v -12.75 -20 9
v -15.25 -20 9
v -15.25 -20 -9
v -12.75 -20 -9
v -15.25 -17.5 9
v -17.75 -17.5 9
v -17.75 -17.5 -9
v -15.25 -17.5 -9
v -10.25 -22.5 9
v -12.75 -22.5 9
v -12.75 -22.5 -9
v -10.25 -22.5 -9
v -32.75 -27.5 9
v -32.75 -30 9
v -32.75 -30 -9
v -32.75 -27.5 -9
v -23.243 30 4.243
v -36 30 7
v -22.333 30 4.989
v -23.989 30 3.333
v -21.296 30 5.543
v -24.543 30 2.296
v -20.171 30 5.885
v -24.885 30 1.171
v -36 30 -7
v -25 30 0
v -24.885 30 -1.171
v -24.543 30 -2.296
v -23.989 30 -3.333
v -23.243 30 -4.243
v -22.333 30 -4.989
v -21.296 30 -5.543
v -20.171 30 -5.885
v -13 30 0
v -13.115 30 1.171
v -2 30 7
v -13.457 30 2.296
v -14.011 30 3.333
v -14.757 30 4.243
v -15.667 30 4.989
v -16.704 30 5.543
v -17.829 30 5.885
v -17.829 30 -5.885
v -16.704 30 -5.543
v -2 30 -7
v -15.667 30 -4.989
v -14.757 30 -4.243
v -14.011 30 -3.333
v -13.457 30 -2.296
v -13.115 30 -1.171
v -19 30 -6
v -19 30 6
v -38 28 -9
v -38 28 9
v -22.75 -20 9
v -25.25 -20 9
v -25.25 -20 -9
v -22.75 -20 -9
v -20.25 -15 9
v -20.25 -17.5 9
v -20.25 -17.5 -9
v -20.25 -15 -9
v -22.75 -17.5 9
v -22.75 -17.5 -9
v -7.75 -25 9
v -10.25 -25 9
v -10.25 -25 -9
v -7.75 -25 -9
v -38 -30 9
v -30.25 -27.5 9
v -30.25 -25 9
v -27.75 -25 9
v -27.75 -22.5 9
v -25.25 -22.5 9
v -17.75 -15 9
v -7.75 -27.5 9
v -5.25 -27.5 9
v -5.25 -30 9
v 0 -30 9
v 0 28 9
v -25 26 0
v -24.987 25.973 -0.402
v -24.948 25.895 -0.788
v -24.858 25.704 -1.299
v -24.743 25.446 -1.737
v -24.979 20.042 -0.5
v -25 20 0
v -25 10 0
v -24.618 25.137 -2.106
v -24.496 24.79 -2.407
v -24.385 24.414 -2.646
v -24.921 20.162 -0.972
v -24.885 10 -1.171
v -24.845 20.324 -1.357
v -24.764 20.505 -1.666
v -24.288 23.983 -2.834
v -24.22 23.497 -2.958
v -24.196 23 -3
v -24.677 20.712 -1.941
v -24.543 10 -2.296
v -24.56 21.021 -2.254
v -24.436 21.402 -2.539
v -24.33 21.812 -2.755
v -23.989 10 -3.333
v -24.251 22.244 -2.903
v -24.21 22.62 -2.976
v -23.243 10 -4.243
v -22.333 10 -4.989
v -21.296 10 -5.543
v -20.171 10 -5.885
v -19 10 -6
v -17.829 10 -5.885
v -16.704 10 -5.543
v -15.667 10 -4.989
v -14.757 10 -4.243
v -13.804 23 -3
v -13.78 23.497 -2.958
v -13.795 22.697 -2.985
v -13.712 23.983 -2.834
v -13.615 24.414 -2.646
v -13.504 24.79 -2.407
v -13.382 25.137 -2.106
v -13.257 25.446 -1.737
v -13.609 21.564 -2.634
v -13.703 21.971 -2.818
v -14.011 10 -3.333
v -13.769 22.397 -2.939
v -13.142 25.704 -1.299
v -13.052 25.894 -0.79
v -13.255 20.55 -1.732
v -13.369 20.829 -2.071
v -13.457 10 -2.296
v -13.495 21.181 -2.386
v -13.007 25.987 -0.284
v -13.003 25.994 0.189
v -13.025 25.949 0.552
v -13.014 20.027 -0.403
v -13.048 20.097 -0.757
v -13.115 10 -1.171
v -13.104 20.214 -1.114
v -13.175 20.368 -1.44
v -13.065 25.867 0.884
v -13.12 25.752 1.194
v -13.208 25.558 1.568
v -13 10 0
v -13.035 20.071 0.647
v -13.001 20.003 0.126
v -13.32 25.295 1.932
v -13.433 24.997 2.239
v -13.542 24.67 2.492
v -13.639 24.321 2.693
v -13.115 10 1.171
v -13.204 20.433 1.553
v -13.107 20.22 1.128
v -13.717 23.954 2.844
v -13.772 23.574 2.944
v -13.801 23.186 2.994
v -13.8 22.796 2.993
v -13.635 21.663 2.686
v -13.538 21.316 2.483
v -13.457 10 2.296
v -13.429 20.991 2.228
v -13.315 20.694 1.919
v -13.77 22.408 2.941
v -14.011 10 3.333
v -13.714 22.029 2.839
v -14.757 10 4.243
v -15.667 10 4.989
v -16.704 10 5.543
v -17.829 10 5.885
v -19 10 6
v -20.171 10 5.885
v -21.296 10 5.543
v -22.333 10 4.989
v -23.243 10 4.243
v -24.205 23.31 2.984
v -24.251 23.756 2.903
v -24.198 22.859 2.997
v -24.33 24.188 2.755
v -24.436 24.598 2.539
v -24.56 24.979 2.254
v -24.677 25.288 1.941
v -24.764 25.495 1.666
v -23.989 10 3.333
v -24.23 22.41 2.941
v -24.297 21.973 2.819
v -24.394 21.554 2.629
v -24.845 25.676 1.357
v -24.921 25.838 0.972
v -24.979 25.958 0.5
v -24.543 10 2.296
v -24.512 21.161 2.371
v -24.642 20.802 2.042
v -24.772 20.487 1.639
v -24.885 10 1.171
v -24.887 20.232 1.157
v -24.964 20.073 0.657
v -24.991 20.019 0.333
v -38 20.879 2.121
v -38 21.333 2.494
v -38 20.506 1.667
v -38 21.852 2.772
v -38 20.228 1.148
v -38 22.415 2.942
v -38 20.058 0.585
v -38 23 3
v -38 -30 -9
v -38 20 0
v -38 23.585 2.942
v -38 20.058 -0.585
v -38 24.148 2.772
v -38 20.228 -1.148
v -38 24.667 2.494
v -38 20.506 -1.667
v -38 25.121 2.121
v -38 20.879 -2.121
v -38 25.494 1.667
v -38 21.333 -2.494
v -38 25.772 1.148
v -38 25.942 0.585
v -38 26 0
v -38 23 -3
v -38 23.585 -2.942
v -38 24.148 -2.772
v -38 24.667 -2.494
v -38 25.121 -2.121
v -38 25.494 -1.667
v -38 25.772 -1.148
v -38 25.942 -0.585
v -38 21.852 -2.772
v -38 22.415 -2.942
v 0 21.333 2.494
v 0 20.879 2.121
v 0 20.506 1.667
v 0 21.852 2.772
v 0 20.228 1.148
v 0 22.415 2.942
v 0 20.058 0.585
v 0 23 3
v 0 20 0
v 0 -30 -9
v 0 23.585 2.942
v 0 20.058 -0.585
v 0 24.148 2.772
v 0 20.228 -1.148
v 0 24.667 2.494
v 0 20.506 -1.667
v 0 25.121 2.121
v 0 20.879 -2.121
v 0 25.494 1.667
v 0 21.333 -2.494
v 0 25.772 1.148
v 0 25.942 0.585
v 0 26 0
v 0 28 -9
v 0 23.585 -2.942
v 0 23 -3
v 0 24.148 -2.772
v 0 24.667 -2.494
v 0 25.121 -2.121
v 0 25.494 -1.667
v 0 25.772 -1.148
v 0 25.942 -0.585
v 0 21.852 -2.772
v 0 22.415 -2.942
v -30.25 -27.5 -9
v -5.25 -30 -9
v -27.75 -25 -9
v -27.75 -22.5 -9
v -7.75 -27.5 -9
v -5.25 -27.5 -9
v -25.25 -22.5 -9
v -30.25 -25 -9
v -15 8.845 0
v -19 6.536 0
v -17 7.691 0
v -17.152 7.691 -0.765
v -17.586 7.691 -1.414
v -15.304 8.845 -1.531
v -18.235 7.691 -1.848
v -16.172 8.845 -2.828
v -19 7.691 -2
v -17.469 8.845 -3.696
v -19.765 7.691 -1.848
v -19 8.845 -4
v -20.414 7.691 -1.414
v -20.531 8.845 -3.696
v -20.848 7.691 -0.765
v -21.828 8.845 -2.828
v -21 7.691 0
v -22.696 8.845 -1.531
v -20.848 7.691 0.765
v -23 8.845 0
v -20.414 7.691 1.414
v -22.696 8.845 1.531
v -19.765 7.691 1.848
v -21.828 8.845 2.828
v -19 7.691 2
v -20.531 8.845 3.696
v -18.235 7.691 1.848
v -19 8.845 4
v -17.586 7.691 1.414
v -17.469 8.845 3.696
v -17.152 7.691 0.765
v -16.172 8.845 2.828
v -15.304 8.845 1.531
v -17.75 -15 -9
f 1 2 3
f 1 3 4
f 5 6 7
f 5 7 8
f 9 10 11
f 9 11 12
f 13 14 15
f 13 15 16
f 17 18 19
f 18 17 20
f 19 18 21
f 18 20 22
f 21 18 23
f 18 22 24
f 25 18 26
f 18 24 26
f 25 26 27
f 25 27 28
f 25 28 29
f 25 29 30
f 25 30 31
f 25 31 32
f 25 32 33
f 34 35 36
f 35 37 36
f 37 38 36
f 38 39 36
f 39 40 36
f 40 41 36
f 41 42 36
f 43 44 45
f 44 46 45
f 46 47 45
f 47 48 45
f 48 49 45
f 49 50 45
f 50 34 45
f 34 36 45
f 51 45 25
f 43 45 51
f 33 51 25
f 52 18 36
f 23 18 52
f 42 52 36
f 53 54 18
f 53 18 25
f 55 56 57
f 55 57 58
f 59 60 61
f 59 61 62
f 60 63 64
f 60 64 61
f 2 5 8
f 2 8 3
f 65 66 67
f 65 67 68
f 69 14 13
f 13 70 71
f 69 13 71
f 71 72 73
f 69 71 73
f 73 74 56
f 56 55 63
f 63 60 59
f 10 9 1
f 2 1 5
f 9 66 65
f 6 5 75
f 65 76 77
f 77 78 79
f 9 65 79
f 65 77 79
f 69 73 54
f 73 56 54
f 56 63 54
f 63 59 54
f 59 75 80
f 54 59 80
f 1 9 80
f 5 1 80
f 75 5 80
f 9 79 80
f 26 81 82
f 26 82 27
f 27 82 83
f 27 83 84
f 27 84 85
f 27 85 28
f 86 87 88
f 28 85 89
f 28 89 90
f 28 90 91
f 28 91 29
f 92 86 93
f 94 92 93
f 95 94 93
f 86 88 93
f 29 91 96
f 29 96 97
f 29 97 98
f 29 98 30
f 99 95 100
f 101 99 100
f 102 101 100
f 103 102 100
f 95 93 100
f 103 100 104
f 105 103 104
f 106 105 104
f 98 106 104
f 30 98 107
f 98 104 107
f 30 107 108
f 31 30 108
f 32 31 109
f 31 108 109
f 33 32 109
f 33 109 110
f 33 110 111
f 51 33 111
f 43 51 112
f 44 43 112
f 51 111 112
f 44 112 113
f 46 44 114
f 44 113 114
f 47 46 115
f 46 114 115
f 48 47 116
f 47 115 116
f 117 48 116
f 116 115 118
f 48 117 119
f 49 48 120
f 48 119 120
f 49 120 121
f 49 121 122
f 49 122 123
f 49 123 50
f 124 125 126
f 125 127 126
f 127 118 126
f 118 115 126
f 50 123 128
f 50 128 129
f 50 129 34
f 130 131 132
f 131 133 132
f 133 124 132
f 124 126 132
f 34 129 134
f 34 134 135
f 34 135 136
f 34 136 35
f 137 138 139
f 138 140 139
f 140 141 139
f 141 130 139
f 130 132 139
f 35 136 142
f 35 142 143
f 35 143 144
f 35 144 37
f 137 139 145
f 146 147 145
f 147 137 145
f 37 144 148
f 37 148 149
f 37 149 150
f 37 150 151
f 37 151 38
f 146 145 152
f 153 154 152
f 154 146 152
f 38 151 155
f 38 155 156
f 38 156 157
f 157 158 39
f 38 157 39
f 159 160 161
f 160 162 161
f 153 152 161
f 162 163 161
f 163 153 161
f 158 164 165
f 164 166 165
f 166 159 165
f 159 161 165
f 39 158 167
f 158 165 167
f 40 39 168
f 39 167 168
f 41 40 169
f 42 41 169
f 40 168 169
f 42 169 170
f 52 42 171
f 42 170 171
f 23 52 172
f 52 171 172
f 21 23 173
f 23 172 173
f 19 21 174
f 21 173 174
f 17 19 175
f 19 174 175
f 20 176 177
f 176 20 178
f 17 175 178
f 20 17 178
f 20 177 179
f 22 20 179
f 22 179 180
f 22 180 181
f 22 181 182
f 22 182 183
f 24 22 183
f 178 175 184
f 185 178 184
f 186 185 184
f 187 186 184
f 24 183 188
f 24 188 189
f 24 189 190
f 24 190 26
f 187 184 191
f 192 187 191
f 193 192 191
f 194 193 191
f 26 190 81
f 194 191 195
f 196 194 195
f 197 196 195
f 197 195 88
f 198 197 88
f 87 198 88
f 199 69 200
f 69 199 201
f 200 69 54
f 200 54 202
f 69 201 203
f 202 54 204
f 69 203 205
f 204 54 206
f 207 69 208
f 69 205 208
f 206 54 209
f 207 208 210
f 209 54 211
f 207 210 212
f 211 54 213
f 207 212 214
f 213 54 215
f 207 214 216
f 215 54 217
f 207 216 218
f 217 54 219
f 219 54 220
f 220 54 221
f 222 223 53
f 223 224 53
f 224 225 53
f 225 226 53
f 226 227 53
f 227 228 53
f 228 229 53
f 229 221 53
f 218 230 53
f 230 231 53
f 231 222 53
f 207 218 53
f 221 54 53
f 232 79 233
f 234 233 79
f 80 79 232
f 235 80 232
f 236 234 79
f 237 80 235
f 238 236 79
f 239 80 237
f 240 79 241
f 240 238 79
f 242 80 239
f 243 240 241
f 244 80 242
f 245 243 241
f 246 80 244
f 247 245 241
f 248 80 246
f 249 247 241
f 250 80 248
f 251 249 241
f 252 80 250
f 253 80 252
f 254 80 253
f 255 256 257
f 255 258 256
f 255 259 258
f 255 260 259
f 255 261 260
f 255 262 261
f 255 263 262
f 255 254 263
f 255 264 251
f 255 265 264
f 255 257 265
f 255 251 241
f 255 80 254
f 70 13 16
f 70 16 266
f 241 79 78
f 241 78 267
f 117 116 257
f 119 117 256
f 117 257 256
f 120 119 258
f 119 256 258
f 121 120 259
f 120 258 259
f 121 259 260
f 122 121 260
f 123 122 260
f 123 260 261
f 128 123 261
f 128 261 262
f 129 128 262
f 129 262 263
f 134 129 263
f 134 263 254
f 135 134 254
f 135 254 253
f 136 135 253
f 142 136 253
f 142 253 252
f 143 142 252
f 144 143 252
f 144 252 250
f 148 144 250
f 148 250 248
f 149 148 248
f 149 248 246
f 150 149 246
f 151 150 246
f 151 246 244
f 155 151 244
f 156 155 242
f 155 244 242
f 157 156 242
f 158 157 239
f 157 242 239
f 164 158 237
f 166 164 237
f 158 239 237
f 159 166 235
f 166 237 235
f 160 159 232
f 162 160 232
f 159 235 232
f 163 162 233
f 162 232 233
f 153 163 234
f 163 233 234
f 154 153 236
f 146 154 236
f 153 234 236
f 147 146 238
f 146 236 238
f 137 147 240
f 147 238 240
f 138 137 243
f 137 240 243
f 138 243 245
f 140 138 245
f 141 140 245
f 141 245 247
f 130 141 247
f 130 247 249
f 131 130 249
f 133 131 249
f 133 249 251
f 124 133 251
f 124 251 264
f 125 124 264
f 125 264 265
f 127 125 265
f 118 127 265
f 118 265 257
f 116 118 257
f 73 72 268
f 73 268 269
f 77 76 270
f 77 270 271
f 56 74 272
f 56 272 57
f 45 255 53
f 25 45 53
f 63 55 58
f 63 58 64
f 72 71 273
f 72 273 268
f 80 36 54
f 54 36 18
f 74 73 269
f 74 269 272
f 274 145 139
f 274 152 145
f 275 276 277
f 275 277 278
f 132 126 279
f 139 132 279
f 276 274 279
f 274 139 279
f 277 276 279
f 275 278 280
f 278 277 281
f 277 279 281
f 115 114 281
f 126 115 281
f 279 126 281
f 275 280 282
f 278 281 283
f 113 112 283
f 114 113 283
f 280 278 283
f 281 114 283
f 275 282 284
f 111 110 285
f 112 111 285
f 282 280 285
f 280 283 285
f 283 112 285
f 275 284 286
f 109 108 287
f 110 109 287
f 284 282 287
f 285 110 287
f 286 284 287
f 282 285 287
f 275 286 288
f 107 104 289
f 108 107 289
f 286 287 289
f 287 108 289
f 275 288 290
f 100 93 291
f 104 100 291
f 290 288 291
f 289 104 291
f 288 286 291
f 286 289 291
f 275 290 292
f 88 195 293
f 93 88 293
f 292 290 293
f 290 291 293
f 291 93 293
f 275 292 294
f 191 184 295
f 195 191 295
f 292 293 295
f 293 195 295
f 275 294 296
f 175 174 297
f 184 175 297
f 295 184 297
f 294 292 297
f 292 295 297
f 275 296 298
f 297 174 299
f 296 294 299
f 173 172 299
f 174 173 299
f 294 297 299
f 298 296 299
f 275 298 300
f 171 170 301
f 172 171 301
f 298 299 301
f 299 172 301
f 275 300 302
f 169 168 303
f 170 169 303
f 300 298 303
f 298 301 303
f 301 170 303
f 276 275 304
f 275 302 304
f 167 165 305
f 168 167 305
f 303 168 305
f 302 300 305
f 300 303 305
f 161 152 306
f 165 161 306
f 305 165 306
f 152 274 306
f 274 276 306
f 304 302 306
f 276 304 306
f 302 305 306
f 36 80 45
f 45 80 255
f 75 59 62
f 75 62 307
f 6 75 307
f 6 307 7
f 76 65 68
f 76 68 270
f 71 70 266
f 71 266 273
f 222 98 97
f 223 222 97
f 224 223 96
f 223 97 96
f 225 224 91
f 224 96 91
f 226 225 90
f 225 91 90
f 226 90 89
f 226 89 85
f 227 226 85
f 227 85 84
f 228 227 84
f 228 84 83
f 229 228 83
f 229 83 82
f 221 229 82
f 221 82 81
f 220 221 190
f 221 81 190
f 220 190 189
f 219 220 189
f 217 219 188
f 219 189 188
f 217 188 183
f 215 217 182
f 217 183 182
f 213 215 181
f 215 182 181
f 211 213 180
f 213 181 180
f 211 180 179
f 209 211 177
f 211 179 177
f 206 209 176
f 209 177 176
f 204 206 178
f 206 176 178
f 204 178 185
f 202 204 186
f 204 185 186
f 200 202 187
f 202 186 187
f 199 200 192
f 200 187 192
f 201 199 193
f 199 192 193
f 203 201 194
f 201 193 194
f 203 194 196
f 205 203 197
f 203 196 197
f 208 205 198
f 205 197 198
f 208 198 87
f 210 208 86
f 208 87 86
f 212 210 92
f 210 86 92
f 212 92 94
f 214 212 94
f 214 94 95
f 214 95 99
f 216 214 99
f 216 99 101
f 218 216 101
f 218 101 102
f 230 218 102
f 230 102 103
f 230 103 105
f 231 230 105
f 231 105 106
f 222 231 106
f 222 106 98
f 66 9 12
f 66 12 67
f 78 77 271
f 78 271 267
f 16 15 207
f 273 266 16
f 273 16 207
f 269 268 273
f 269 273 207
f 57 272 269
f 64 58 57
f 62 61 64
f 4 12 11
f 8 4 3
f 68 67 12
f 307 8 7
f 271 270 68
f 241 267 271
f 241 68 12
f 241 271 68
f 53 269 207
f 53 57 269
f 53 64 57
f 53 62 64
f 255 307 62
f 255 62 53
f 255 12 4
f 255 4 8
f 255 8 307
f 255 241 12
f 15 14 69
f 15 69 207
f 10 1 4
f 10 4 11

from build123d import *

# Parameters (mm, degrees)
SKETCH1_W                   = 18
SKETCH1_H                   = 60
SKETCH1_R                   = 3
BOSS_EXTRUDE1_DEPTH         = 38
CHAMFER1_SIZE               = 2
CUT_EXTRUDE1_DEPTH          = 38
M12X1_25_TAPPED_HOLE1_D     = 12
M12X1_25_TAPPED_HOLE1_DEPTH = 20
M12X1_25_TAPPED_HOLE1_TIP   = 3.464101615


with BuildPart() as part:
    # Sketch1 → Boss-Extrude1 (new body)
    with BuildSketch(Plane(origin=(0, 0, 0), x_dir=(0, 0, -1), z_dir=(1, 0, 0))):
        Rectangle(SKETCH1_W, SKETCH1_H)
        with Locations((0, 23)):
            Circle(SKETCH1_R, mode=Mode.SUBTRACT)
    extrude(amount=-BOSS_EXTRUDE1_DEPTH)

    # Chamfer1
    chamfer1_edges = [part.edges().sort_by_distance(p)[0] for p in [
        (-38, 30, 0),
        (0, 30, 0),
        (-19, 30, 9),
        (-19, 30, -9),
    ]]
    chamfer(chamfer1_edges, length=CHAMFER1_SIZE)

    # Sketch2 → Cut-Extrude1 (cut)
    with BuildSketch(Plane.XY.offset(9)):
        Polygon((-32.75, -30), (-32.75, -27.5), (-30.25, -27.5), (-30.25, -25), (-27.75, -25), (-27.75, -22.5), (-25.25, -22.5), (-25.25, -20), (-22.75, -20), (-22.75, -17.5), (-20.25, -17.5), (-20.25, -15), (-17.75, -15), (-17.75, -17.5), (-15.25, -17.5), (-15.25, -20), (-12.75, -20), (-12.75, -22.5), (-10.25, -22.5), (-10.25, -25), (-7.75, -25), (-7.75, -27.5), (-5.25, -27.5), (-5.25, -30), align=None)
    extrude(amount=-CUT_EXTRUDE1_DEPTH, mode=Mode.SUBTRACT)

    # M12x1.25 Tapped Hole1
    with Locations(Plane(origin=(0, 30, 0), x_dir=(1, 0, 0), z_dir=(0, 1, 0))):
        with Locations((-19, 0)):
            Hole(M12X1_25_TAPPED_HOLE1_D / 2, depth=M12X1_25_TAPPED_HOLE1_DEPTH)
            with Locations((0, 0, -(M12X1_25_TAPPED_HOLE1_DEPTH + M12X1_25_TAPPED_HOLE1_TIP / 2))):  # 120° drill point
                Cone(0, M12X1_25_TAPPED_HOLE1_D / 2, M12X1_25_TAPPED_HOLE1_TIP, mode=Mode.SUBTRACT)


solid = part.part
